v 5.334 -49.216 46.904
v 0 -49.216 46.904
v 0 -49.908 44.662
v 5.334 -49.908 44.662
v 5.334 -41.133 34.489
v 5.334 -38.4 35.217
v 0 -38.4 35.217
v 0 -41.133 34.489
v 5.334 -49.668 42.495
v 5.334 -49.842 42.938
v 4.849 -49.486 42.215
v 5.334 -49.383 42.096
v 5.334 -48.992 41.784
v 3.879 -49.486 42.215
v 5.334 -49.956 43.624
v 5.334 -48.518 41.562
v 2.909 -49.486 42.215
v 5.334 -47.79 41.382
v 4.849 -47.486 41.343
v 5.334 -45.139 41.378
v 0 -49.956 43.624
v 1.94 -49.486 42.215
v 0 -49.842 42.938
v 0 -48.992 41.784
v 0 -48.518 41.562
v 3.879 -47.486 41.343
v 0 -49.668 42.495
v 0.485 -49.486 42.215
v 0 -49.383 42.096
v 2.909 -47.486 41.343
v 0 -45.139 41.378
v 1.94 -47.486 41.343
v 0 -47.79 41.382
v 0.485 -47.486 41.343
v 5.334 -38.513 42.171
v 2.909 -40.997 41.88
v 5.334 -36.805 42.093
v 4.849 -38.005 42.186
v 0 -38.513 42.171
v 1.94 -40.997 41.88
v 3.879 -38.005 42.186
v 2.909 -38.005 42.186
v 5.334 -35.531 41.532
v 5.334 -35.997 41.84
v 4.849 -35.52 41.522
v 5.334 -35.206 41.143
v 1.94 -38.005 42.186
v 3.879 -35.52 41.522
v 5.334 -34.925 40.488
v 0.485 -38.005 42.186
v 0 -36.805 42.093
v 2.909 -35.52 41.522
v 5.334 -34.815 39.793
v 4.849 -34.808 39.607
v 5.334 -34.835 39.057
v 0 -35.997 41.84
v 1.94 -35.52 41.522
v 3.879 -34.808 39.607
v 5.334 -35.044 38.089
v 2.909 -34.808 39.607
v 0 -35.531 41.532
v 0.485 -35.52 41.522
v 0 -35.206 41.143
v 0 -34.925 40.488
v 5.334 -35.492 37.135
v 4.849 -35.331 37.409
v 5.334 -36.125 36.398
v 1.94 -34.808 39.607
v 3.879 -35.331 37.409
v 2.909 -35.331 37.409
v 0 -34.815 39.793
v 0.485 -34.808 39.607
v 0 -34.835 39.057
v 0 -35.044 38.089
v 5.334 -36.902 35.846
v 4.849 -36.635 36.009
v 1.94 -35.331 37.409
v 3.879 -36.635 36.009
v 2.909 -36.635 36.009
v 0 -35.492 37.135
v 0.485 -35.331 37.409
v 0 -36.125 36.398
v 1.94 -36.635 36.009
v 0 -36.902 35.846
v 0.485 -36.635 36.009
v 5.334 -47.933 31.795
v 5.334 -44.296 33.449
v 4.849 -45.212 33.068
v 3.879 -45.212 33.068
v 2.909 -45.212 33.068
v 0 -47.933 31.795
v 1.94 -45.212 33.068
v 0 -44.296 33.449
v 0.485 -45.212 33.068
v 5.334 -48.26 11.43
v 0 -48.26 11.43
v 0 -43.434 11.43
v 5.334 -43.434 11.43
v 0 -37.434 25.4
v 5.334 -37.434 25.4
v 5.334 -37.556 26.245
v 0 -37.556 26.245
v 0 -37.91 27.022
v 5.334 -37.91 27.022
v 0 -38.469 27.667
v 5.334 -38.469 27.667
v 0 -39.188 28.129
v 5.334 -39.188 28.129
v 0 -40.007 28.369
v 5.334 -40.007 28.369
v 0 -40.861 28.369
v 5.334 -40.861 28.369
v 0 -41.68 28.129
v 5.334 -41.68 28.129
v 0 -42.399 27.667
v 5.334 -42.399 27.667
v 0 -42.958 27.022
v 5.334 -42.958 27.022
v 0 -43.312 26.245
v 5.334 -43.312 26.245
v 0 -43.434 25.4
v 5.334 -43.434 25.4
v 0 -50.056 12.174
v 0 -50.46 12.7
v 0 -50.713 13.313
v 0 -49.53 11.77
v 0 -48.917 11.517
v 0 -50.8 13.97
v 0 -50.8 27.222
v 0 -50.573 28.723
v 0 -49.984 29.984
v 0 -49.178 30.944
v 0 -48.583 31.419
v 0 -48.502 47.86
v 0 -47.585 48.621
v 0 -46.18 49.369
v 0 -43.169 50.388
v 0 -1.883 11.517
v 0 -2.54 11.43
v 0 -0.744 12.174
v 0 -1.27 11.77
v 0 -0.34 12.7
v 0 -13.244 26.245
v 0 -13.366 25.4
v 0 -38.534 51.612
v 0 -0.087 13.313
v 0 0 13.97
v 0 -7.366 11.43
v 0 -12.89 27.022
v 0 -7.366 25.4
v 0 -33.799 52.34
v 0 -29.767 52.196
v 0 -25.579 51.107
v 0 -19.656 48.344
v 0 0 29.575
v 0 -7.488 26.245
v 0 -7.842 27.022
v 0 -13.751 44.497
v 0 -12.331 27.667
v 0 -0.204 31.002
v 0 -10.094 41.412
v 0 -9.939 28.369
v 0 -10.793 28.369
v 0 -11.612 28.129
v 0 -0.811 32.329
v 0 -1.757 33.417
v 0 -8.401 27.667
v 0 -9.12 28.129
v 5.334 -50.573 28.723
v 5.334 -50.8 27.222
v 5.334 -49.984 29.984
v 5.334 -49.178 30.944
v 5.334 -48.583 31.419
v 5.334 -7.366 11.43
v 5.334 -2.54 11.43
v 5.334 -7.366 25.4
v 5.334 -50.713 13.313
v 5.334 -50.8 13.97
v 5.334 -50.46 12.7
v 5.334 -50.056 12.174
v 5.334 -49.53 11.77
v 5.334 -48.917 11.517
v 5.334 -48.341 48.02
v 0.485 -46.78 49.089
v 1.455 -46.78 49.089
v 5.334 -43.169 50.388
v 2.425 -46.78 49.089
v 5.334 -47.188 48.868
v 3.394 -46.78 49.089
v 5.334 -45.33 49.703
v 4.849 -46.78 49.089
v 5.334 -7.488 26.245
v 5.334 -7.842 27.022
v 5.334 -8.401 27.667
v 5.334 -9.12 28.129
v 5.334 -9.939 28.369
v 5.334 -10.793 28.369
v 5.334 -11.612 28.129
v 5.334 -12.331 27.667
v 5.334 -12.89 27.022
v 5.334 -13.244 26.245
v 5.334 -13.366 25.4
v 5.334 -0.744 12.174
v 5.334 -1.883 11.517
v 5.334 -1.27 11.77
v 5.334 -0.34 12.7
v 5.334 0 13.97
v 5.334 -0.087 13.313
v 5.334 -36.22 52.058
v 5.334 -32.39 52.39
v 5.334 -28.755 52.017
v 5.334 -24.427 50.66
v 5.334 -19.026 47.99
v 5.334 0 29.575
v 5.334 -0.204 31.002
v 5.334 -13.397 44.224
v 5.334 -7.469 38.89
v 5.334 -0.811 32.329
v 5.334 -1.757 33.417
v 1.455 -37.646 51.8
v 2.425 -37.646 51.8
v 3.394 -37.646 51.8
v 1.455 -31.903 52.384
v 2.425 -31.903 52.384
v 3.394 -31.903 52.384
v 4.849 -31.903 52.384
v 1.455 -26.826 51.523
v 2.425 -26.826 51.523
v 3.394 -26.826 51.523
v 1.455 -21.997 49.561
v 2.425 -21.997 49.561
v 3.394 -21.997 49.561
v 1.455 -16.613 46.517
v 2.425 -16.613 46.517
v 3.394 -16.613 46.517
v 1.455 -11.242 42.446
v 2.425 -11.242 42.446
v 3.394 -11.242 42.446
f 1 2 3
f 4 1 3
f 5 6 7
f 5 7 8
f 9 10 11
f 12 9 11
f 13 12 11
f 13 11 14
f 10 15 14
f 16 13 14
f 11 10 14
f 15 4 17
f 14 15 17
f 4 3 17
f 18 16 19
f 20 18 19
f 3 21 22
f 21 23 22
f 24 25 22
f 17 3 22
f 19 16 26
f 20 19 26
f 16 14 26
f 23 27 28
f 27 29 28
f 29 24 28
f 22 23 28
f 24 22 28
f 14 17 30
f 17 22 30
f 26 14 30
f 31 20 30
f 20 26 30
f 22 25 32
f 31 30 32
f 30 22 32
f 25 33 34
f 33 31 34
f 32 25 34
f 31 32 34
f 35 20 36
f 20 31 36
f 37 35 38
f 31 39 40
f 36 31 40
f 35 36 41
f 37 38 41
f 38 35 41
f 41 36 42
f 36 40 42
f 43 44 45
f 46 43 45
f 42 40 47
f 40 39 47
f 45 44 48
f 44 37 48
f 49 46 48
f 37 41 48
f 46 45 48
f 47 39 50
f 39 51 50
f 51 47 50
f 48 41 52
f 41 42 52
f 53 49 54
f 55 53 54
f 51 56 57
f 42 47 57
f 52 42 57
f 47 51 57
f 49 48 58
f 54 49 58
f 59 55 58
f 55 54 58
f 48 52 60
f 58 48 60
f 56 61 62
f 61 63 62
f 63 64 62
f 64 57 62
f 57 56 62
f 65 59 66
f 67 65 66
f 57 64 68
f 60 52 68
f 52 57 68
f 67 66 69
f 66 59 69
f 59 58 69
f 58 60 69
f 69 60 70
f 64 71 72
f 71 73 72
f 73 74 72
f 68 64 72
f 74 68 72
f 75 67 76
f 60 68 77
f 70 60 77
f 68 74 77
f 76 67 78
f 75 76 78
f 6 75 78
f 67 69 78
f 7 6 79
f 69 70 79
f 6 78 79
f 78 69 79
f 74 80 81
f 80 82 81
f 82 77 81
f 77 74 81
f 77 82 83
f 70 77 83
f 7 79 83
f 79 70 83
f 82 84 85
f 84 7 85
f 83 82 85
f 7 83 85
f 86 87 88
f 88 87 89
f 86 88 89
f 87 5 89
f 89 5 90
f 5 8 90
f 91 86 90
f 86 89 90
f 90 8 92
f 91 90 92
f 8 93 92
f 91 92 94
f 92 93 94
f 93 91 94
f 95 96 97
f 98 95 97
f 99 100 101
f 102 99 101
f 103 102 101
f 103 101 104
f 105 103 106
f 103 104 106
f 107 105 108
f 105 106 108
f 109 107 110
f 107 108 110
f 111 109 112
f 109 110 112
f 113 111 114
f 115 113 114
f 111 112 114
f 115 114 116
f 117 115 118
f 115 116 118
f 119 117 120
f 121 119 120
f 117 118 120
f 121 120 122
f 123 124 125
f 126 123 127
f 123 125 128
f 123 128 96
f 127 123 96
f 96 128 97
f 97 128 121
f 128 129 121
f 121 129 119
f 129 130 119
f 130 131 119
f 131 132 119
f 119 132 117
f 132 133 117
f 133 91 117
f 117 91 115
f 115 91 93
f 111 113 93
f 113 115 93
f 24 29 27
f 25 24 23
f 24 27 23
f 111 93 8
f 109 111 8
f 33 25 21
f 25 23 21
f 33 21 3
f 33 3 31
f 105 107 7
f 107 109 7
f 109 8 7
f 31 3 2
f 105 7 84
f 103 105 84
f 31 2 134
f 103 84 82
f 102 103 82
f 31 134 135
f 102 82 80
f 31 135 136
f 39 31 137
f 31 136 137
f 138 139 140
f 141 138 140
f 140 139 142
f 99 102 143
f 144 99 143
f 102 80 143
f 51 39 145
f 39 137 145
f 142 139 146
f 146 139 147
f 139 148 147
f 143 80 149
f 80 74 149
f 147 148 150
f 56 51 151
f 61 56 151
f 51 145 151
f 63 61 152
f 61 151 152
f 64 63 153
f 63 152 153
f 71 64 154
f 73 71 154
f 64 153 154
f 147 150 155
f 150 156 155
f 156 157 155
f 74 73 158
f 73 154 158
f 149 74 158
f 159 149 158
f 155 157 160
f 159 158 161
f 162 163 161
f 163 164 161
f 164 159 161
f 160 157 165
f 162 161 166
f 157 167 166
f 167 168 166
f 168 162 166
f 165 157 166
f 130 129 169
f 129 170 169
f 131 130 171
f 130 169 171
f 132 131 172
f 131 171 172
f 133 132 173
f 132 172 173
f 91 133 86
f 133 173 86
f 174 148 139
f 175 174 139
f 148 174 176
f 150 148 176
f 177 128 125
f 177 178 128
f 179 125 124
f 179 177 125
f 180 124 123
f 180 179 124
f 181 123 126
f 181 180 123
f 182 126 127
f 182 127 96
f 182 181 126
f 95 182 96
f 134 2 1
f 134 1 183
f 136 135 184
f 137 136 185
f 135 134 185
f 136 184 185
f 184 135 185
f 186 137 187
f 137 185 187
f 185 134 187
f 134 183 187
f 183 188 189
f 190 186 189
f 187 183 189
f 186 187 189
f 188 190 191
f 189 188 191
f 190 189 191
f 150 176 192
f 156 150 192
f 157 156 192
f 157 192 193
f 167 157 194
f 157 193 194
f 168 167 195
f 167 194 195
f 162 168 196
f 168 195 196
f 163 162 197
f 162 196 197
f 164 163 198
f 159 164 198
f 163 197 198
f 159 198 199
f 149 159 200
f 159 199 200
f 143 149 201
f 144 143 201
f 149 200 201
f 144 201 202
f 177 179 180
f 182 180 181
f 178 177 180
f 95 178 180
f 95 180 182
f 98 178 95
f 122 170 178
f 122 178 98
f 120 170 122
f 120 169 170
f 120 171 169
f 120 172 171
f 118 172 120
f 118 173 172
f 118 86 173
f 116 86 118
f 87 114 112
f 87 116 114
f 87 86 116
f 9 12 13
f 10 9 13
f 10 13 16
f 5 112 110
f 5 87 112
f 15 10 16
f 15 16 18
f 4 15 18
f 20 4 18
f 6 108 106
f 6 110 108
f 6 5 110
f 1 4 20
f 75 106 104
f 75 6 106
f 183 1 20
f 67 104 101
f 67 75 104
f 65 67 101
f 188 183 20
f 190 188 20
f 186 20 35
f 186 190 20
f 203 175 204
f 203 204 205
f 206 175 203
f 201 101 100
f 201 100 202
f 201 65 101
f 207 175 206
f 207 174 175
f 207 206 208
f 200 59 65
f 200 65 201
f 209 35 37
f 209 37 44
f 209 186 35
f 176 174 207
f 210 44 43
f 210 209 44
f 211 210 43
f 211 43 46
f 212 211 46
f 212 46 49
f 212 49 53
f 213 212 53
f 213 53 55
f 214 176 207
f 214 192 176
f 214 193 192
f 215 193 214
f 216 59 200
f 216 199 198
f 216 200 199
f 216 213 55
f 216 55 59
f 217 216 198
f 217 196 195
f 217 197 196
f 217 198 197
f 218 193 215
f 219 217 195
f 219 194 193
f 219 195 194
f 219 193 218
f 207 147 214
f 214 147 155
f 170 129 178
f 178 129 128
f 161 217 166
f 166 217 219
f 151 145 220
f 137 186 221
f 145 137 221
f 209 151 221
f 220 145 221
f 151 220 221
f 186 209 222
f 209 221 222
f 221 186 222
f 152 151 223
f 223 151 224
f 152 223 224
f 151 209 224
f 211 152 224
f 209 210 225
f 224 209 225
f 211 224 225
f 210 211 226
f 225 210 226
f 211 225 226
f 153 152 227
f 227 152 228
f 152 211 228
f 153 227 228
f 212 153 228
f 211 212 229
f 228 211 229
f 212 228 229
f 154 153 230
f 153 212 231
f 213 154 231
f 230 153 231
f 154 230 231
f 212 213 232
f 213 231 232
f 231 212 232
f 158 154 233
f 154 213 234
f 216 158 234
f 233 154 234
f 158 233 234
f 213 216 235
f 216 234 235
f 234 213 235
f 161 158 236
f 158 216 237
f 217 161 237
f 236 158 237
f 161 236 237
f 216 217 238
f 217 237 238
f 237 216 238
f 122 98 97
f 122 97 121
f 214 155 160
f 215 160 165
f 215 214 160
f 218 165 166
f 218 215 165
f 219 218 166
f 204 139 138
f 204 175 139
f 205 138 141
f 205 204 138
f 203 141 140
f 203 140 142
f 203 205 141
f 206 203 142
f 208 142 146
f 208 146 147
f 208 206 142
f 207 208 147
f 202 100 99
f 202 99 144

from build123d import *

# Parameters (mm, degrees)
F1_DEPTH = 5.334
F3_DEPTH = 5.3350001
F4_R     = 5.08
F5_R     = 2.54
F6_W     = 36.068
F6_H     = 13.97
F7_DEPTH = 17.78
F8_R     = 3
F9_DEPTH = 25.4


with BuildPart() as f1:
    # F0 (on Right) → F1 (new body)
    with BuildSketch(Plane.YZ):
        with BuildLine():
            Line((-50.8, 11.43), (0, 11.43))
            Line((0, 11.43), (0, 57.15))
            add(Edge.make_bspline(
                [(0, 57.15), (-5.0864698629, 56.4354143524), (-33.0306025683, 52.8582353512), (-40.9902625249, 52.5659859038), (-49.0611626862, 49.6942699568), (-51.0854872261, 40.966135658), (-44.5636889928, 41.3799068183), (-41.3822269171, 41.8054239397), (-34.4252354146, 42.8947705402), (-34.7579917432, 36.8022554531), (-38.7459499638, 34.8204749581), (-43.0560316299, 34.3391200928), (-49.0676849442, 31.2087605884), (-50.8, 30.4399446528)],
                knots=[0, 0, 0, 0, 0.1878700993, 0.2909777412, 0.3815785793, 0.4646880591, 0.5355583295, 0.601659826, 0.6791143746, 0.7462010786, 0.8103759885, 0.89875752, 0.9468801373, 0.9468801373, 0.9468801373, 0.9468801373], degree=3))
            Line((-50.8, 30.4399446528), (-50.8, 11.43))
        make_face()
    extrude(amount=F1_DEPTH)

    # F2 (on face) → F3 (cut, through all)
    with BuildSketch(Plane.YZ.offset(5.334)):
        with BuildLine():
            add(Edge.make_bspline(
                [(-43.1693890139, 50.388118398), (-39.7406359516, 51.3934960231), (-31.7182572435, 53.5175740522), (-21.6443977008, 49.82088335), (-10.8654291215, 43.1109471619), (-0.4289153334, 31.0209751225), (8.6297517382, 27.9005714688), (9.708355156, -7.7185275745), (30.1667757831, 99.5192737608), (-76.3935103956, 48.5795673993), (-50.2748634043, 38.1811857896), (-50.3174004116, 48.1507766506), (-45.8470825407, 49.6029661546), (-43.1693890139, 50.388118398)],
                knots=[0, 0, 0, 0, 0.0751825419, 0.1465137079, 0.2263287662, 0.3133956971, 0.3838267121, 0.4666822969, 0.630919419, 0.8154599942, 0.8837684012, 0.9412860005, 1, 1, 1, 1], degree=3))
        make_face()
    extrude(amount=-F3_DEPTH, mode=Mode.SUBTRACT)

    # F4
    f4_edges = [f1.edges().sort_by_distance(p)[0] for p in [
        (2.667, -50.8, 30.439945),
        (2.667, 0, 32.000665),
    ]]
    fillet(f4_edges, radius=F4_R)

    # F5
    f5_edges = [f1.edges().sort_by_distance(p)[0] for p in [
        (2.667, -50.8, 11.43),
        (2.667, 0, 11.43),
    ]]
    fillet(f5_edges, radius=F5_R)

    # F6 (on face) → F7 (cut)
    with BuildSketch(Plane.YZ.offset(5.334)):
        with Locations((-25.4, 18.415)):
            Rectangle(F6_W, F6_H)
    extrude(amount=-F7_DEPTH, mode=Mode.SUBTRACT)

    # F8 (on face) → F9 (cut)
    with BuildSketch(Plane.YZ.offset(5.334)):
        with Locations((-10.366, 25.4)):
            Circle(F8_R)
        with Locations((-40.434, 25.4)):
            Circle(F8_R)
    extrude(amount=-F9_DEPTH, mode=Mode.SUBTRACT)


solid = f1.part
